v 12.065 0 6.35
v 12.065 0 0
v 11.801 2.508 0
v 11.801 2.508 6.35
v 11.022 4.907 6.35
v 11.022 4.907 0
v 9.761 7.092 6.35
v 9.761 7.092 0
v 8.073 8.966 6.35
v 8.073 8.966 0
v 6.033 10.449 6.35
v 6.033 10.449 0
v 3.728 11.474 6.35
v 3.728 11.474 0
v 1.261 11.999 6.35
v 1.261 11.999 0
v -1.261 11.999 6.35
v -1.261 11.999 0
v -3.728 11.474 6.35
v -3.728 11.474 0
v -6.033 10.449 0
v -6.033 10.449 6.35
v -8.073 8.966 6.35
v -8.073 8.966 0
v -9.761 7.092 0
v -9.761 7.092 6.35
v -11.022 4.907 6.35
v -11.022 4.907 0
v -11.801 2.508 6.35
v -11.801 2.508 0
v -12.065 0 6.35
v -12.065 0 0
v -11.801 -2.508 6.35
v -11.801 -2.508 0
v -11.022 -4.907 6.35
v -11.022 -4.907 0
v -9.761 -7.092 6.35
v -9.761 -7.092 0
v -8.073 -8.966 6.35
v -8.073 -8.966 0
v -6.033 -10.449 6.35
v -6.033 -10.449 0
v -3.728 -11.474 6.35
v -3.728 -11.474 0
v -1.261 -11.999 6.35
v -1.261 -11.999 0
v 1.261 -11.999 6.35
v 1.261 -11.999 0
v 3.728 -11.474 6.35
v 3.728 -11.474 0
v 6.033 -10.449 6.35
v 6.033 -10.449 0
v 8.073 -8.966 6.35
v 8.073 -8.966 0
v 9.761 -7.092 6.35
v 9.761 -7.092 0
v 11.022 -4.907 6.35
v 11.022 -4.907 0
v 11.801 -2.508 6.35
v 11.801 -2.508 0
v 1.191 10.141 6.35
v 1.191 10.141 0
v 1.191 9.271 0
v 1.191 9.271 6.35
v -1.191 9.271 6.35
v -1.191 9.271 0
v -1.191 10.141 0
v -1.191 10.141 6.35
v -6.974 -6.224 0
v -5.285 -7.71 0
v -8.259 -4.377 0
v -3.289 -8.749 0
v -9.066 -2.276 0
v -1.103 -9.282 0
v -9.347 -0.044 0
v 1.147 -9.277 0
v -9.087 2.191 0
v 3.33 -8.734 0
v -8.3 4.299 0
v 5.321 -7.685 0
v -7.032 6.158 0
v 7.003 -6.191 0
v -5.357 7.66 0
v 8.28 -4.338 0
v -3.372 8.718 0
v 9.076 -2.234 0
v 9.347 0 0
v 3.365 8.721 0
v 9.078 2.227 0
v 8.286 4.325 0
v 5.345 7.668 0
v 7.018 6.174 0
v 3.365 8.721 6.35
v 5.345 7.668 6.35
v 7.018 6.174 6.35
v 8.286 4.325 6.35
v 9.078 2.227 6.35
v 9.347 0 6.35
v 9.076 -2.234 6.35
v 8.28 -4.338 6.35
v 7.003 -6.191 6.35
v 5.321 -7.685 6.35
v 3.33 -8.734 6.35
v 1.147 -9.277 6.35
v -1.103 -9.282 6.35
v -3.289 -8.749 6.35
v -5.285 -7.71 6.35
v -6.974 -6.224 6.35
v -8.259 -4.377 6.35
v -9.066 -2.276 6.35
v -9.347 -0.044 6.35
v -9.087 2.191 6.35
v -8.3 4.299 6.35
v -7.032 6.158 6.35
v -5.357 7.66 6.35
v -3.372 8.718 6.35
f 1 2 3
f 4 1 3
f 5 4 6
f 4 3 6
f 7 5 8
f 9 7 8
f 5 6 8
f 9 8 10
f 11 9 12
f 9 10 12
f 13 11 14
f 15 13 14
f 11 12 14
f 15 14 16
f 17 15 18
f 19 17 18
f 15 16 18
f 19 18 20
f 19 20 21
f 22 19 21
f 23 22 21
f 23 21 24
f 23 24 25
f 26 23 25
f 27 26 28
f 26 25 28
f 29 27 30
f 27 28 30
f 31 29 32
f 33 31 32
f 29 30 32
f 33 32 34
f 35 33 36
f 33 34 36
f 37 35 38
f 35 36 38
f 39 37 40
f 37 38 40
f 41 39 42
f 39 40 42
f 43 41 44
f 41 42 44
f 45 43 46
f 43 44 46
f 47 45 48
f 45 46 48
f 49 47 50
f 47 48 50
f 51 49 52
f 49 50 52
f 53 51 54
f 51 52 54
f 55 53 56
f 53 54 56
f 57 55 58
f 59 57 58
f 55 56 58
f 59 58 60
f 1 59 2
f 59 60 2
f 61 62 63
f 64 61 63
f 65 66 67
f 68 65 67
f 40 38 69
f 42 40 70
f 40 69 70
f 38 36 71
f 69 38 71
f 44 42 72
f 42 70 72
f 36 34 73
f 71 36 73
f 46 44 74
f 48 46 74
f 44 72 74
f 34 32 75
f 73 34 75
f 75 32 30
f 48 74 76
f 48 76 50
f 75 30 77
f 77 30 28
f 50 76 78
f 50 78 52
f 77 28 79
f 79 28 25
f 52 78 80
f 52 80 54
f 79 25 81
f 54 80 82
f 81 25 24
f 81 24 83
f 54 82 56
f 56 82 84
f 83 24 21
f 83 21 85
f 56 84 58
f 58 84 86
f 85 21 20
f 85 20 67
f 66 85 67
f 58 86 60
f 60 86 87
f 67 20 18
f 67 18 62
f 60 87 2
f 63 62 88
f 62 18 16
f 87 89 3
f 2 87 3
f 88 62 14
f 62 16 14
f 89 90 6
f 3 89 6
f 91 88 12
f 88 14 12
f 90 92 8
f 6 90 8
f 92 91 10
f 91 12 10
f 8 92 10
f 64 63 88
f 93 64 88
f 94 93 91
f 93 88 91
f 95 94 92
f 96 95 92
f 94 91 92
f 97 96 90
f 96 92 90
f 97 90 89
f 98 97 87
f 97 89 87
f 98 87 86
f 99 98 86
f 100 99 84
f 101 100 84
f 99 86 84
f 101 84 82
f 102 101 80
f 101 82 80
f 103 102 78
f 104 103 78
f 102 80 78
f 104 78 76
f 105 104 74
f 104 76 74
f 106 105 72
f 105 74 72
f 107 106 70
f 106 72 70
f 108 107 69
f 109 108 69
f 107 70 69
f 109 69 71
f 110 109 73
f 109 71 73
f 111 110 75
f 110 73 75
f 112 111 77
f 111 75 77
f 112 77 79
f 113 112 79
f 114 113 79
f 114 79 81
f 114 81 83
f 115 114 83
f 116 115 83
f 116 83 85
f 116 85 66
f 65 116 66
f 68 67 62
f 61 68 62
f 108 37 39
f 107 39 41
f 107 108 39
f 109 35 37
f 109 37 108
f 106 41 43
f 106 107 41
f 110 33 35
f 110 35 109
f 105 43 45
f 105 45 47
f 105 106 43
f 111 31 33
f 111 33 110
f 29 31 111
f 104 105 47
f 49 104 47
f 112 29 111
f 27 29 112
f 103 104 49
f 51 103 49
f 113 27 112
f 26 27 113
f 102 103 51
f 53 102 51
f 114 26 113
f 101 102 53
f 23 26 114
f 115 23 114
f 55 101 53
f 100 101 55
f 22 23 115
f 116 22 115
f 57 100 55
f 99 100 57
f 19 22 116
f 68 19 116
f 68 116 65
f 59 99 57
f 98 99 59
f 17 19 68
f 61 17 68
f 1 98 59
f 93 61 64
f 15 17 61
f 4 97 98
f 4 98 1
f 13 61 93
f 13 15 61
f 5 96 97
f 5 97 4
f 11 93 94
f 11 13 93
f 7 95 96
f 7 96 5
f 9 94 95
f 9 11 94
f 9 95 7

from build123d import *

# Parameters (mm, degrees)
F0_R     = 12.065
F1_DEPTH = 6.35


with BuildPart() as f1:
    # F0 (on Top) → F1 (new body)
    with BuildSketch(Plane.XY):
        Circle(F0_R)
        with BuildLine():
            ThreePointArc((1.190625, 9.27106), (7.017804, 6.174186), (9.3472, 0))
            ThreePointArc((9.3472, 0), (-6.174186, -7.017804), (-1.190625, 9.27106))
            Line((-1.190625, 9.27106), (-1.190625, 10.14095))
            Line((-1.190625, 10.14095), (1.190625, 10.14095))
            Line((1.190625, 10.14095), (1.190625, 9.27106))
        make_face(mode=Mode.SUBTRACT)
    extrude(amount=F1_DEPTH)


solid = f1.part
